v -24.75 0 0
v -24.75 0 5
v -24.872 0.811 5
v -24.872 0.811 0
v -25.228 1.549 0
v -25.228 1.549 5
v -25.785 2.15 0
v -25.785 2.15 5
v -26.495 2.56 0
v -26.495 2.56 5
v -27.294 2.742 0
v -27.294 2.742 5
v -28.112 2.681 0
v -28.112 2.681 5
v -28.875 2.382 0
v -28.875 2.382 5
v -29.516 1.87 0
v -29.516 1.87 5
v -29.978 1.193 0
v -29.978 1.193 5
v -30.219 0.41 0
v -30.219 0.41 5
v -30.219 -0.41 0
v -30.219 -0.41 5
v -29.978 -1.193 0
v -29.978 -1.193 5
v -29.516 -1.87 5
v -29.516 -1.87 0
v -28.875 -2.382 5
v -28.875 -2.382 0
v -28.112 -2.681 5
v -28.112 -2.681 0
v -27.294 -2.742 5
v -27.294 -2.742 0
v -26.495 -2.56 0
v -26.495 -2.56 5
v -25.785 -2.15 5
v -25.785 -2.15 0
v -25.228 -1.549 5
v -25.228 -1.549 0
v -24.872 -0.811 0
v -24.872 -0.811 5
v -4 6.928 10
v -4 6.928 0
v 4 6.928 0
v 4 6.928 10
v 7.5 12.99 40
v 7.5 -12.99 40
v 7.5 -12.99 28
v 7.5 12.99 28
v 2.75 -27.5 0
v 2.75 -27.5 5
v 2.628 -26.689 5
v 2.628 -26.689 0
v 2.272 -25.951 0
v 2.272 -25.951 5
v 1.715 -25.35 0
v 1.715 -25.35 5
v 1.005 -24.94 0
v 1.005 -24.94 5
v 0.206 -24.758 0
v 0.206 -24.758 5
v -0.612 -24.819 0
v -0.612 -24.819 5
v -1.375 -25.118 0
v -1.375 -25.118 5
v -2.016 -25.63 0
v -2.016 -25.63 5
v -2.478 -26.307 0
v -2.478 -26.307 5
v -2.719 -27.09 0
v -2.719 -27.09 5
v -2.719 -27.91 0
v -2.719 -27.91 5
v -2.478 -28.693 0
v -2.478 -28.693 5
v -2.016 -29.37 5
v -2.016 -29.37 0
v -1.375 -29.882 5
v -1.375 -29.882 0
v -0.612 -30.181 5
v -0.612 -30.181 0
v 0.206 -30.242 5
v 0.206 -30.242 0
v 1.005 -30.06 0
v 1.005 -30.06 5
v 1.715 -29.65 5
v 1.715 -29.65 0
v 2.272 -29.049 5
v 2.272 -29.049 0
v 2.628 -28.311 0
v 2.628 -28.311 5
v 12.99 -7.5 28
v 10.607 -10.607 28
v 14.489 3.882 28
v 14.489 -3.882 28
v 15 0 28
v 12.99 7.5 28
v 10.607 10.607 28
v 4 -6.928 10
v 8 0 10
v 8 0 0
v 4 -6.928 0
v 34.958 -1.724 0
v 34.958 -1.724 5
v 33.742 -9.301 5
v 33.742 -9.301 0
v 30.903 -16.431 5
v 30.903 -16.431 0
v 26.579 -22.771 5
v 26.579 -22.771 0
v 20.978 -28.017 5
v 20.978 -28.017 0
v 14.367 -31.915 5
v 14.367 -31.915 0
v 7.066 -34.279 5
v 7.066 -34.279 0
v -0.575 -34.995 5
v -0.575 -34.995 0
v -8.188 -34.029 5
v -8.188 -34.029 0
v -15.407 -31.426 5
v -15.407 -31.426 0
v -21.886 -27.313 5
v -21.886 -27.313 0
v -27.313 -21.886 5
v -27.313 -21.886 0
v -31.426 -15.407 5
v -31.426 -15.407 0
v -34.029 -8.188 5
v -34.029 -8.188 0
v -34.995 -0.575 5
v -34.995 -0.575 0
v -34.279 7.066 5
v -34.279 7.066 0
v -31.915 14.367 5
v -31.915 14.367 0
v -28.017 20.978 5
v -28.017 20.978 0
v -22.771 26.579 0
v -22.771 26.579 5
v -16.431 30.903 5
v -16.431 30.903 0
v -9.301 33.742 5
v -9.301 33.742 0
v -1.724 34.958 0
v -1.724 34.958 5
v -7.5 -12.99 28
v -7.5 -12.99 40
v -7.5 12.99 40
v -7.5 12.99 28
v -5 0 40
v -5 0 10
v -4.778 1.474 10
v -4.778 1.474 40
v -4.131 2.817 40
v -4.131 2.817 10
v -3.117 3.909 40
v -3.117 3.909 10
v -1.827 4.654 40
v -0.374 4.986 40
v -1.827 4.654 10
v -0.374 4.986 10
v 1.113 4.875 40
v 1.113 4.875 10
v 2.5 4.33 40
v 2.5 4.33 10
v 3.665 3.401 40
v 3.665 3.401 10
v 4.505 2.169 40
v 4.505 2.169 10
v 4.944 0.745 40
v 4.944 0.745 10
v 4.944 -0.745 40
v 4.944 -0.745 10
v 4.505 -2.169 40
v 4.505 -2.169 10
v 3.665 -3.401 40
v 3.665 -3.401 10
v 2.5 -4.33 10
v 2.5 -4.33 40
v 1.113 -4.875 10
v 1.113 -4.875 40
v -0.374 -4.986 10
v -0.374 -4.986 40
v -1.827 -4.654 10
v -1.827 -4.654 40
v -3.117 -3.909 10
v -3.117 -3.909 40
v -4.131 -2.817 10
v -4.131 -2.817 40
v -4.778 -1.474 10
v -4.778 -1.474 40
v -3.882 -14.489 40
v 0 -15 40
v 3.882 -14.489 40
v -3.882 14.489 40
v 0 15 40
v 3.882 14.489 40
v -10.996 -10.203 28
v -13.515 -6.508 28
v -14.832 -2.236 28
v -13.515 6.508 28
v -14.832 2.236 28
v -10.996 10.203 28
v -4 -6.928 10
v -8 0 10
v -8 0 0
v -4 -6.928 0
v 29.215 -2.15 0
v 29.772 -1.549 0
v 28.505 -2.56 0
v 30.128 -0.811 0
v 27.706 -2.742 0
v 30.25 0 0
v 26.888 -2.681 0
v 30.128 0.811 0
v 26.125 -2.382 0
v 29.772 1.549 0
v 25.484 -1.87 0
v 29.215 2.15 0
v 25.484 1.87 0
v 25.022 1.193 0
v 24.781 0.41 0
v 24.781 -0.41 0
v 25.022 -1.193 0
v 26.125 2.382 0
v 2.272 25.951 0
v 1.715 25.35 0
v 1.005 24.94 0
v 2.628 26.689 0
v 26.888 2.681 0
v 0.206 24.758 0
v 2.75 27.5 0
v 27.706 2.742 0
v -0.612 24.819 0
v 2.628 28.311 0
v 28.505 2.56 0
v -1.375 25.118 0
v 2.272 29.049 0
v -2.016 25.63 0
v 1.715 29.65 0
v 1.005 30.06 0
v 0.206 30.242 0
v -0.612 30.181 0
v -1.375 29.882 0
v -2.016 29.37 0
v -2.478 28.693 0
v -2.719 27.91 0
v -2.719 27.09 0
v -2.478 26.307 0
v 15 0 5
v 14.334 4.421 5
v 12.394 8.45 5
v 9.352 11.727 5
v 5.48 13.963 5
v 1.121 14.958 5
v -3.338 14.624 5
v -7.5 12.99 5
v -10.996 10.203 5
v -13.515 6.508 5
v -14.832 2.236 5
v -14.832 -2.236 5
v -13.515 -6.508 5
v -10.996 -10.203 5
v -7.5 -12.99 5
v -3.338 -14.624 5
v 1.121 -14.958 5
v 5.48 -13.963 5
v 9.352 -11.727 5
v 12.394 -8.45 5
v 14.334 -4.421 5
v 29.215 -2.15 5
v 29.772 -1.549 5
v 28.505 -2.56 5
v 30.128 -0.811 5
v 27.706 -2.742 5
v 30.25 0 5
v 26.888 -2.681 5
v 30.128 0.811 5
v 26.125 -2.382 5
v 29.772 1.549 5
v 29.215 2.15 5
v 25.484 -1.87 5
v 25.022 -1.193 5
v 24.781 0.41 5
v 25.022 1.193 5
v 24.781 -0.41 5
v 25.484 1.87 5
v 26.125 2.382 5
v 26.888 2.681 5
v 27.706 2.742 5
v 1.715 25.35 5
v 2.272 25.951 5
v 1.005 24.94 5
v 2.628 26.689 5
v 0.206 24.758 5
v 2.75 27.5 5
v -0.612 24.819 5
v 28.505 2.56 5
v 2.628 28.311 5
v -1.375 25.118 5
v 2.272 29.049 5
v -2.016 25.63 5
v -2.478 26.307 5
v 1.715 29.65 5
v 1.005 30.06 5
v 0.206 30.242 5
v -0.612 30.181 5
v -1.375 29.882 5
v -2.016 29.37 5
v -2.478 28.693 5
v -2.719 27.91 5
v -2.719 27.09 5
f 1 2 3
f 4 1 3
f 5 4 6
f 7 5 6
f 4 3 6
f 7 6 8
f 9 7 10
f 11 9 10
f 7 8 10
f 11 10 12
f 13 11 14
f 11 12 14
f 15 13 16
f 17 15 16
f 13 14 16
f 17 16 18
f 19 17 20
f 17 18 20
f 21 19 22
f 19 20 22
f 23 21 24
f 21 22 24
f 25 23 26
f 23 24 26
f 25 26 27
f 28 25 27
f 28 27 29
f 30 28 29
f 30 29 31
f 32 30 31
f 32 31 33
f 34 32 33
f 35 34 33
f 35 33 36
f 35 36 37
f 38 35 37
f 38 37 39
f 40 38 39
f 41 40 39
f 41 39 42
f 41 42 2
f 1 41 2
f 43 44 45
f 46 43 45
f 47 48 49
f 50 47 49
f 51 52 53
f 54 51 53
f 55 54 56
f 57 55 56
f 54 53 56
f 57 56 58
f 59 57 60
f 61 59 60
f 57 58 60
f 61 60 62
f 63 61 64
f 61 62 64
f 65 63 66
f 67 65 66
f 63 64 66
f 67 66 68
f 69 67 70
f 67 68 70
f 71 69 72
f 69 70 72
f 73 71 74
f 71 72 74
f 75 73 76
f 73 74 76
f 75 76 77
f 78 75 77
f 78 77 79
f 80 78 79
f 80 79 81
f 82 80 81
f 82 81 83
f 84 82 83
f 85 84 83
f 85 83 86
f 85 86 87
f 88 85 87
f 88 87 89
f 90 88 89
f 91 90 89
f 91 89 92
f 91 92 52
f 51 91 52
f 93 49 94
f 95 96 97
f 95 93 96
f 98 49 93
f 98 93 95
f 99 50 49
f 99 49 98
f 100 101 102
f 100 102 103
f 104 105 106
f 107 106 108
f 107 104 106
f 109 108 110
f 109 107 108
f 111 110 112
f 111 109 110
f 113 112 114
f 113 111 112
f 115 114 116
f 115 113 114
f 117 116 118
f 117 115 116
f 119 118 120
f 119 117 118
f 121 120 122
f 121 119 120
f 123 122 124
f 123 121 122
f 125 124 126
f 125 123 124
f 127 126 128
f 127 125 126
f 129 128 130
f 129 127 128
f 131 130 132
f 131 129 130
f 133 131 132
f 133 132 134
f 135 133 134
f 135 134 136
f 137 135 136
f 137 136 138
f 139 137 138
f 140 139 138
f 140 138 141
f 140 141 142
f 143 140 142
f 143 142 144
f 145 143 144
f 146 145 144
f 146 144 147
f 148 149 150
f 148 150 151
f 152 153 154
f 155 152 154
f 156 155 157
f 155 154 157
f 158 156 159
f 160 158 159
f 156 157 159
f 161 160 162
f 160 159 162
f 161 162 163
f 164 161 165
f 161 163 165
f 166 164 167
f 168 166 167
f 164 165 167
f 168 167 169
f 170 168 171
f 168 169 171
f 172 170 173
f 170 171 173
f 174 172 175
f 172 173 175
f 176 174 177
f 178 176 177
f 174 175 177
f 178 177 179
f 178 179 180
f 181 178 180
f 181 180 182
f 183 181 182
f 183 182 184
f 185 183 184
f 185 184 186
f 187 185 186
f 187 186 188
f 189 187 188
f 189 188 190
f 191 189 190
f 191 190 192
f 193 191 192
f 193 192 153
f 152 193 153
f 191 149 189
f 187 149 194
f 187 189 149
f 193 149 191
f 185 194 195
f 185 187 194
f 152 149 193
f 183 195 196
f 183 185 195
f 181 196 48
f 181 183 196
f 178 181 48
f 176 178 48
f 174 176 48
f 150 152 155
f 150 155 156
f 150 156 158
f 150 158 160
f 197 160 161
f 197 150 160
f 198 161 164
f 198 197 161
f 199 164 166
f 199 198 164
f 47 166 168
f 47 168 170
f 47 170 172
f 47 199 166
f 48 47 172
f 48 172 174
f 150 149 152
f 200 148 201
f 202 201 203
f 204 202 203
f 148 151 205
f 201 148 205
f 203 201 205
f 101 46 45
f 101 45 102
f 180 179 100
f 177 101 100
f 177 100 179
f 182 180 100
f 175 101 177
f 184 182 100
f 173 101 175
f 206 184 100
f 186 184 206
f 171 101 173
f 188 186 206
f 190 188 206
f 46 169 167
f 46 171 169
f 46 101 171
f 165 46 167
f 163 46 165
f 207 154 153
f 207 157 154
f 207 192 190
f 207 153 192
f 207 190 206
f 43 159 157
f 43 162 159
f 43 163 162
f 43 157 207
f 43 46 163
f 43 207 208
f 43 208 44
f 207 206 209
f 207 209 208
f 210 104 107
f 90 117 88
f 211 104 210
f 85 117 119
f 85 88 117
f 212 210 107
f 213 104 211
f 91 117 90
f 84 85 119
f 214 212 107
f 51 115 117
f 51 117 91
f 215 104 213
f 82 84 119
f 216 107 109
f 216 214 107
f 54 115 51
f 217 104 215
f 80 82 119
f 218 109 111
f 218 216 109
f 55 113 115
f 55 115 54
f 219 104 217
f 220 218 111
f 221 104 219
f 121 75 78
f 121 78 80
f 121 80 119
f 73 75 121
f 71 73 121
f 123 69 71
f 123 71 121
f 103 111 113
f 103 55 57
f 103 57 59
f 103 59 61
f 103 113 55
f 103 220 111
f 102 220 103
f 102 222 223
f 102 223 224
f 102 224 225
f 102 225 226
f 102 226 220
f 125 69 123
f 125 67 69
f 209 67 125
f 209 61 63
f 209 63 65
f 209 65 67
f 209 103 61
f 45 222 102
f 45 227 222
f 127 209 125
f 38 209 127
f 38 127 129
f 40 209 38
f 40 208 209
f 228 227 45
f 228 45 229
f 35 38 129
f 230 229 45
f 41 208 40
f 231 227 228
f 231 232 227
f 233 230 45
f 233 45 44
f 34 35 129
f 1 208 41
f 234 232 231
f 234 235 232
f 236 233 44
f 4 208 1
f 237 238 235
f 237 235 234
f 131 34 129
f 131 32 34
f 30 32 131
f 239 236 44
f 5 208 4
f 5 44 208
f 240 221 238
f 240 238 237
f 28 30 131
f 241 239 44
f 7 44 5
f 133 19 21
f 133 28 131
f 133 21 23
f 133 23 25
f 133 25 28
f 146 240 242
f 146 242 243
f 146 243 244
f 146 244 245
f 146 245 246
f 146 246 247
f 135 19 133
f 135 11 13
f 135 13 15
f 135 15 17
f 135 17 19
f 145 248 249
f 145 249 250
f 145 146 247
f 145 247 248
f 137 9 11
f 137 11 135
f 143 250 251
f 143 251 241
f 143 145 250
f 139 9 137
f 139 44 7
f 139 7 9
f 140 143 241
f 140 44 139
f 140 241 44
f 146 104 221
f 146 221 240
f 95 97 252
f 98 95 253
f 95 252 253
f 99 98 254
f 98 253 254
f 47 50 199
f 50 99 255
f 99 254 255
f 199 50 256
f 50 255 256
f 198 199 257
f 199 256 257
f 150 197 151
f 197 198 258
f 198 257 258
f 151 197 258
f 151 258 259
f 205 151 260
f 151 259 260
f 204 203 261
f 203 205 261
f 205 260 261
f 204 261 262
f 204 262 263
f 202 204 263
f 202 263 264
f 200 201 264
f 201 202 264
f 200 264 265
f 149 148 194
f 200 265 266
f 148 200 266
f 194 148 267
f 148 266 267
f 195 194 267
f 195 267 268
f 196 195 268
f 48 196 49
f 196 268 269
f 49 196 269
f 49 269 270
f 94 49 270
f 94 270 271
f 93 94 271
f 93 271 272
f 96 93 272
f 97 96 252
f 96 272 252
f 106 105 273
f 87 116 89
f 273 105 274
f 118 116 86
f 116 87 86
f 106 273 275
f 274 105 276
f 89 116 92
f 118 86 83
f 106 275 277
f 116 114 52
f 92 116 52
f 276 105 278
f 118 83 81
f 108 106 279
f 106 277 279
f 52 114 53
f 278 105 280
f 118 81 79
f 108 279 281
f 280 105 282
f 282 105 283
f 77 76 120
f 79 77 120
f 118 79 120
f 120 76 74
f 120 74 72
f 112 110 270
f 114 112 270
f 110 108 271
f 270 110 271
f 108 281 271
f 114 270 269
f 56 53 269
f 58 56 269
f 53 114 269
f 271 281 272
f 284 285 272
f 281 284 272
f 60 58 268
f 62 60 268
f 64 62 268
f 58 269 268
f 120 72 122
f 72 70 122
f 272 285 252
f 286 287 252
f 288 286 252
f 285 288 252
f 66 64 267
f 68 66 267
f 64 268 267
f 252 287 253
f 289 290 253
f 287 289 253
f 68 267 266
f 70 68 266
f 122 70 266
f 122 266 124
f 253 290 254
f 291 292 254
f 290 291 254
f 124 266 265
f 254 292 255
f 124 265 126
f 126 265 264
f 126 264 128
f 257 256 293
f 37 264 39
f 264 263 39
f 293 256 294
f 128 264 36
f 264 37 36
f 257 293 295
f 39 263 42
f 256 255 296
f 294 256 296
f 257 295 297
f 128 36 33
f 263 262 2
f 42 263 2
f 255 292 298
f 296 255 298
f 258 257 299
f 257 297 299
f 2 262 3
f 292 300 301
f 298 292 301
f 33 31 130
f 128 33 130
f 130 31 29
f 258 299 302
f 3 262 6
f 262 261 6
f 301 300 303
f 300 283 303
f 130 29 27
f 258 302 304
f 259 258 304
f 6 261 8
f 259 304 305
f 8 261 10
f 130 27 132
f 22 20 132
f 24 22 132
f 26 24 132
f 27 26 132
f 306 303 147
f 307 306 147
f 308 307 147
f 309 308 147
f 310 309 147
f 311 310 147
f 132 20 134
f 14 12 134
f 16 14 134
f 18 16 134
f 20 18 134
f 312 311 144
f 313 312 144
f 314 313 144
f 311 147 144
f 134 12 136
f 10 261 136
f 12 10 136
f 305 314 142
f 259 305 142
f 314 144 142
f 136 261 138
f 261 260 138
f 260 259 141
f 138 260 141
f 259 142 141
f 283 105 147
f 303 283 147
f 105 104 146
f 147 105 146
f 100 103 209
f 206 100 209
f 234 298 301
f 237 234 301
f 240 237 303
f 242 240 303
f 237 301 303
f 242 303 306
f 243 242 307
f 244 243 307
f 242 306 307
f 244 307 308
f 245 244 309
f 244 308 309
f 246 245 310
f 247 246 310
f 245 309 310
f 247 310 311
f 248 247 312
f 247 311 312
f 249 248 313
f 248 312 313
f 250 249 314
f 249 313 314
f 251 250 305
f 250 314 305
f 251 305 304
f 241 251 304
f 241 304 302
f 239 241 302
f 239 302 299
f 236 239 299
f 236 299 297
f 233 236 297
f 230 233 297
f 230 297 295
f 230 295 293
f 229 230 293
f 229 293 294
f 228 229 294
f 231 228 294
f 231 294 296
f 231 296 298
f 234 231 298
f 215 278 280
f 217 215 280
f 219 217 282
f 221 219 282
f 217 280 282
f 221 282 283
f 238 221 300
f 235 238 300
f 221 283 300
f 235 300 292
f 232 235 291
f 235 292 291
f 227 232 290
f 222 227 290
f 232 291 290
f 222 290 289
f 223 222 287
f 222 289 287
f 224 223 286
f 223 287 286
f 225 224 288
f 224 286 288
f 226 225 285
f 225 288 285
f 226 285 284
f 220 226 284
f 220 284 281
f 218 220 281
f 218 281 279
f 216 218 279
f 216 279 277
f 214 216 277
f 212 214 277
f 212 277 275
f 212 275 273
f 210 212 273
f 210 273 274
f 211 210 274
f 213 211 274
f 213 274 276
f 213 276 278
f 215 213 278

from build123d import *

# Parameters (mm, degrees)
SKETCH1_R            = 15
BOSS_EXTRUDE1_DEPTH  = 40
SKETCH2_R            = 35
BOSS_EXTRUDE2_DEPTH  = 5
SKETCH3_R            = 5
CUT_EXTRUDE1_DEPTH   = 64.639610307
CUT_EXTRUDE2_DEPTH   = 10
SKETCH5_W            = 7.5
SKETCH5_H            = 12
CUT_EXTRUDE3_DEPTH   = 64.639610307
M5_CLEARANCE_HOLE1_D = 5.5
CUT_EXTRUDE4_DEPTH   = 64.639610307


with BuildPart() as part:
    # Sketch1 → Boss-Extrude1 (new body)
    with BuildSketch(Plane.XY):
        Circle(SKETCH1_R)
    extrude(amount=BOSS_EXTRUDE1_DEPTH)

    # Sketch2 → Boss-Extrude2 (add)
    with BuildSketch(Plane(origin=(0, 0, 0), x_dir=(-1, 0, 0), z_dir=(0, 0, -1))):
        Circle(SKETCH2_R)
    extrude(amount=-BOSS_EXTRUDE2_DEPTH)

    # Sketch3 → Cut-Extrude1 (cut, through all)
    with BuildSketch(Plane(origin=(0, 0, 0), x_dir=(-1, 0, 0), z_dir=(0, 0, -1))):
        Circle(SKETCH3_R)
    extrude(amount=-CUT_EXTRUDE1_DEPTH, mode=Mode.SUBTRACT)

    # Sketch4 → Cut-Extrude2 (cut)
    with BuildSketch(Plane(origin=(0, 0, 0), x_dir=(-1, 0, 0), z_dir=(0, 0, -1))):
        Polygon((8, 0), (4, 6.92820323), (-4, 6.92820323), (-8, 0), (-4, -6.92820323), (4, -6.92820323), align=None)
    extrude(amount=-CUT_EXTRUDE2_DEPTH, mode=Mode.SUBTRACT)

    # Sketch5 → Cut-Extrude3 (cut, symmetric)
    with BuildSketch(Plane(origin=(0, 0, 0), x_dir=(1, 0, 0), z_dir=(0, 1, 0))):
        with Locations((11.25, -34)):
            Rectangle(SKETCH5_W, SKETCH5_H)
    cut_extrude3 = extrude(amount=CUT_EXTRUDE3_DEPTH, both=True, mode=Mode.SUBTRACT)

    # Mirror1: Cut-Extrude3 across plane
    add(cut_extrude3.mirror(Plane(origin=(0, 0, 0), x_dir=(0, 0, 1), z_dir=(1, 0, 0))), mode=Mode.SUBTRACT)

    # M5 Clearance Hole1 (through all)
    with Locations(Plane(origin=(0, 0, 0), x_dir=(-1, 0, 0), z_dir=(0, 0, -1))):
        with Locations((0, 27.5), (-27.5, 0), (27.5, 0), (0, -27.5)):
            Hole(M5_CLEARANCE_HOLE1_D / 2)

    # Sketch8 → Cut-Extrude4 (cut, through all)
    with BuildSketch(Plane(origin=(0, 0, 0), x_dir=(-1, 0, 0), z_dir=(0, 0, -1))):
        with BuildLine():
            Line((-34.957538249, -1.723519533), (1.723519533, 34.957538249))
            ThreePointArc((1.723519533, 34.957538249), (-24.748737342, 24.748737342), (-34.957538249, -1.723519533))
        make_face()
    extrude(amount=-CUT_EXTRUDE4_DEPTH, mode=Mode.SUBTRACT)


solid = part.part
